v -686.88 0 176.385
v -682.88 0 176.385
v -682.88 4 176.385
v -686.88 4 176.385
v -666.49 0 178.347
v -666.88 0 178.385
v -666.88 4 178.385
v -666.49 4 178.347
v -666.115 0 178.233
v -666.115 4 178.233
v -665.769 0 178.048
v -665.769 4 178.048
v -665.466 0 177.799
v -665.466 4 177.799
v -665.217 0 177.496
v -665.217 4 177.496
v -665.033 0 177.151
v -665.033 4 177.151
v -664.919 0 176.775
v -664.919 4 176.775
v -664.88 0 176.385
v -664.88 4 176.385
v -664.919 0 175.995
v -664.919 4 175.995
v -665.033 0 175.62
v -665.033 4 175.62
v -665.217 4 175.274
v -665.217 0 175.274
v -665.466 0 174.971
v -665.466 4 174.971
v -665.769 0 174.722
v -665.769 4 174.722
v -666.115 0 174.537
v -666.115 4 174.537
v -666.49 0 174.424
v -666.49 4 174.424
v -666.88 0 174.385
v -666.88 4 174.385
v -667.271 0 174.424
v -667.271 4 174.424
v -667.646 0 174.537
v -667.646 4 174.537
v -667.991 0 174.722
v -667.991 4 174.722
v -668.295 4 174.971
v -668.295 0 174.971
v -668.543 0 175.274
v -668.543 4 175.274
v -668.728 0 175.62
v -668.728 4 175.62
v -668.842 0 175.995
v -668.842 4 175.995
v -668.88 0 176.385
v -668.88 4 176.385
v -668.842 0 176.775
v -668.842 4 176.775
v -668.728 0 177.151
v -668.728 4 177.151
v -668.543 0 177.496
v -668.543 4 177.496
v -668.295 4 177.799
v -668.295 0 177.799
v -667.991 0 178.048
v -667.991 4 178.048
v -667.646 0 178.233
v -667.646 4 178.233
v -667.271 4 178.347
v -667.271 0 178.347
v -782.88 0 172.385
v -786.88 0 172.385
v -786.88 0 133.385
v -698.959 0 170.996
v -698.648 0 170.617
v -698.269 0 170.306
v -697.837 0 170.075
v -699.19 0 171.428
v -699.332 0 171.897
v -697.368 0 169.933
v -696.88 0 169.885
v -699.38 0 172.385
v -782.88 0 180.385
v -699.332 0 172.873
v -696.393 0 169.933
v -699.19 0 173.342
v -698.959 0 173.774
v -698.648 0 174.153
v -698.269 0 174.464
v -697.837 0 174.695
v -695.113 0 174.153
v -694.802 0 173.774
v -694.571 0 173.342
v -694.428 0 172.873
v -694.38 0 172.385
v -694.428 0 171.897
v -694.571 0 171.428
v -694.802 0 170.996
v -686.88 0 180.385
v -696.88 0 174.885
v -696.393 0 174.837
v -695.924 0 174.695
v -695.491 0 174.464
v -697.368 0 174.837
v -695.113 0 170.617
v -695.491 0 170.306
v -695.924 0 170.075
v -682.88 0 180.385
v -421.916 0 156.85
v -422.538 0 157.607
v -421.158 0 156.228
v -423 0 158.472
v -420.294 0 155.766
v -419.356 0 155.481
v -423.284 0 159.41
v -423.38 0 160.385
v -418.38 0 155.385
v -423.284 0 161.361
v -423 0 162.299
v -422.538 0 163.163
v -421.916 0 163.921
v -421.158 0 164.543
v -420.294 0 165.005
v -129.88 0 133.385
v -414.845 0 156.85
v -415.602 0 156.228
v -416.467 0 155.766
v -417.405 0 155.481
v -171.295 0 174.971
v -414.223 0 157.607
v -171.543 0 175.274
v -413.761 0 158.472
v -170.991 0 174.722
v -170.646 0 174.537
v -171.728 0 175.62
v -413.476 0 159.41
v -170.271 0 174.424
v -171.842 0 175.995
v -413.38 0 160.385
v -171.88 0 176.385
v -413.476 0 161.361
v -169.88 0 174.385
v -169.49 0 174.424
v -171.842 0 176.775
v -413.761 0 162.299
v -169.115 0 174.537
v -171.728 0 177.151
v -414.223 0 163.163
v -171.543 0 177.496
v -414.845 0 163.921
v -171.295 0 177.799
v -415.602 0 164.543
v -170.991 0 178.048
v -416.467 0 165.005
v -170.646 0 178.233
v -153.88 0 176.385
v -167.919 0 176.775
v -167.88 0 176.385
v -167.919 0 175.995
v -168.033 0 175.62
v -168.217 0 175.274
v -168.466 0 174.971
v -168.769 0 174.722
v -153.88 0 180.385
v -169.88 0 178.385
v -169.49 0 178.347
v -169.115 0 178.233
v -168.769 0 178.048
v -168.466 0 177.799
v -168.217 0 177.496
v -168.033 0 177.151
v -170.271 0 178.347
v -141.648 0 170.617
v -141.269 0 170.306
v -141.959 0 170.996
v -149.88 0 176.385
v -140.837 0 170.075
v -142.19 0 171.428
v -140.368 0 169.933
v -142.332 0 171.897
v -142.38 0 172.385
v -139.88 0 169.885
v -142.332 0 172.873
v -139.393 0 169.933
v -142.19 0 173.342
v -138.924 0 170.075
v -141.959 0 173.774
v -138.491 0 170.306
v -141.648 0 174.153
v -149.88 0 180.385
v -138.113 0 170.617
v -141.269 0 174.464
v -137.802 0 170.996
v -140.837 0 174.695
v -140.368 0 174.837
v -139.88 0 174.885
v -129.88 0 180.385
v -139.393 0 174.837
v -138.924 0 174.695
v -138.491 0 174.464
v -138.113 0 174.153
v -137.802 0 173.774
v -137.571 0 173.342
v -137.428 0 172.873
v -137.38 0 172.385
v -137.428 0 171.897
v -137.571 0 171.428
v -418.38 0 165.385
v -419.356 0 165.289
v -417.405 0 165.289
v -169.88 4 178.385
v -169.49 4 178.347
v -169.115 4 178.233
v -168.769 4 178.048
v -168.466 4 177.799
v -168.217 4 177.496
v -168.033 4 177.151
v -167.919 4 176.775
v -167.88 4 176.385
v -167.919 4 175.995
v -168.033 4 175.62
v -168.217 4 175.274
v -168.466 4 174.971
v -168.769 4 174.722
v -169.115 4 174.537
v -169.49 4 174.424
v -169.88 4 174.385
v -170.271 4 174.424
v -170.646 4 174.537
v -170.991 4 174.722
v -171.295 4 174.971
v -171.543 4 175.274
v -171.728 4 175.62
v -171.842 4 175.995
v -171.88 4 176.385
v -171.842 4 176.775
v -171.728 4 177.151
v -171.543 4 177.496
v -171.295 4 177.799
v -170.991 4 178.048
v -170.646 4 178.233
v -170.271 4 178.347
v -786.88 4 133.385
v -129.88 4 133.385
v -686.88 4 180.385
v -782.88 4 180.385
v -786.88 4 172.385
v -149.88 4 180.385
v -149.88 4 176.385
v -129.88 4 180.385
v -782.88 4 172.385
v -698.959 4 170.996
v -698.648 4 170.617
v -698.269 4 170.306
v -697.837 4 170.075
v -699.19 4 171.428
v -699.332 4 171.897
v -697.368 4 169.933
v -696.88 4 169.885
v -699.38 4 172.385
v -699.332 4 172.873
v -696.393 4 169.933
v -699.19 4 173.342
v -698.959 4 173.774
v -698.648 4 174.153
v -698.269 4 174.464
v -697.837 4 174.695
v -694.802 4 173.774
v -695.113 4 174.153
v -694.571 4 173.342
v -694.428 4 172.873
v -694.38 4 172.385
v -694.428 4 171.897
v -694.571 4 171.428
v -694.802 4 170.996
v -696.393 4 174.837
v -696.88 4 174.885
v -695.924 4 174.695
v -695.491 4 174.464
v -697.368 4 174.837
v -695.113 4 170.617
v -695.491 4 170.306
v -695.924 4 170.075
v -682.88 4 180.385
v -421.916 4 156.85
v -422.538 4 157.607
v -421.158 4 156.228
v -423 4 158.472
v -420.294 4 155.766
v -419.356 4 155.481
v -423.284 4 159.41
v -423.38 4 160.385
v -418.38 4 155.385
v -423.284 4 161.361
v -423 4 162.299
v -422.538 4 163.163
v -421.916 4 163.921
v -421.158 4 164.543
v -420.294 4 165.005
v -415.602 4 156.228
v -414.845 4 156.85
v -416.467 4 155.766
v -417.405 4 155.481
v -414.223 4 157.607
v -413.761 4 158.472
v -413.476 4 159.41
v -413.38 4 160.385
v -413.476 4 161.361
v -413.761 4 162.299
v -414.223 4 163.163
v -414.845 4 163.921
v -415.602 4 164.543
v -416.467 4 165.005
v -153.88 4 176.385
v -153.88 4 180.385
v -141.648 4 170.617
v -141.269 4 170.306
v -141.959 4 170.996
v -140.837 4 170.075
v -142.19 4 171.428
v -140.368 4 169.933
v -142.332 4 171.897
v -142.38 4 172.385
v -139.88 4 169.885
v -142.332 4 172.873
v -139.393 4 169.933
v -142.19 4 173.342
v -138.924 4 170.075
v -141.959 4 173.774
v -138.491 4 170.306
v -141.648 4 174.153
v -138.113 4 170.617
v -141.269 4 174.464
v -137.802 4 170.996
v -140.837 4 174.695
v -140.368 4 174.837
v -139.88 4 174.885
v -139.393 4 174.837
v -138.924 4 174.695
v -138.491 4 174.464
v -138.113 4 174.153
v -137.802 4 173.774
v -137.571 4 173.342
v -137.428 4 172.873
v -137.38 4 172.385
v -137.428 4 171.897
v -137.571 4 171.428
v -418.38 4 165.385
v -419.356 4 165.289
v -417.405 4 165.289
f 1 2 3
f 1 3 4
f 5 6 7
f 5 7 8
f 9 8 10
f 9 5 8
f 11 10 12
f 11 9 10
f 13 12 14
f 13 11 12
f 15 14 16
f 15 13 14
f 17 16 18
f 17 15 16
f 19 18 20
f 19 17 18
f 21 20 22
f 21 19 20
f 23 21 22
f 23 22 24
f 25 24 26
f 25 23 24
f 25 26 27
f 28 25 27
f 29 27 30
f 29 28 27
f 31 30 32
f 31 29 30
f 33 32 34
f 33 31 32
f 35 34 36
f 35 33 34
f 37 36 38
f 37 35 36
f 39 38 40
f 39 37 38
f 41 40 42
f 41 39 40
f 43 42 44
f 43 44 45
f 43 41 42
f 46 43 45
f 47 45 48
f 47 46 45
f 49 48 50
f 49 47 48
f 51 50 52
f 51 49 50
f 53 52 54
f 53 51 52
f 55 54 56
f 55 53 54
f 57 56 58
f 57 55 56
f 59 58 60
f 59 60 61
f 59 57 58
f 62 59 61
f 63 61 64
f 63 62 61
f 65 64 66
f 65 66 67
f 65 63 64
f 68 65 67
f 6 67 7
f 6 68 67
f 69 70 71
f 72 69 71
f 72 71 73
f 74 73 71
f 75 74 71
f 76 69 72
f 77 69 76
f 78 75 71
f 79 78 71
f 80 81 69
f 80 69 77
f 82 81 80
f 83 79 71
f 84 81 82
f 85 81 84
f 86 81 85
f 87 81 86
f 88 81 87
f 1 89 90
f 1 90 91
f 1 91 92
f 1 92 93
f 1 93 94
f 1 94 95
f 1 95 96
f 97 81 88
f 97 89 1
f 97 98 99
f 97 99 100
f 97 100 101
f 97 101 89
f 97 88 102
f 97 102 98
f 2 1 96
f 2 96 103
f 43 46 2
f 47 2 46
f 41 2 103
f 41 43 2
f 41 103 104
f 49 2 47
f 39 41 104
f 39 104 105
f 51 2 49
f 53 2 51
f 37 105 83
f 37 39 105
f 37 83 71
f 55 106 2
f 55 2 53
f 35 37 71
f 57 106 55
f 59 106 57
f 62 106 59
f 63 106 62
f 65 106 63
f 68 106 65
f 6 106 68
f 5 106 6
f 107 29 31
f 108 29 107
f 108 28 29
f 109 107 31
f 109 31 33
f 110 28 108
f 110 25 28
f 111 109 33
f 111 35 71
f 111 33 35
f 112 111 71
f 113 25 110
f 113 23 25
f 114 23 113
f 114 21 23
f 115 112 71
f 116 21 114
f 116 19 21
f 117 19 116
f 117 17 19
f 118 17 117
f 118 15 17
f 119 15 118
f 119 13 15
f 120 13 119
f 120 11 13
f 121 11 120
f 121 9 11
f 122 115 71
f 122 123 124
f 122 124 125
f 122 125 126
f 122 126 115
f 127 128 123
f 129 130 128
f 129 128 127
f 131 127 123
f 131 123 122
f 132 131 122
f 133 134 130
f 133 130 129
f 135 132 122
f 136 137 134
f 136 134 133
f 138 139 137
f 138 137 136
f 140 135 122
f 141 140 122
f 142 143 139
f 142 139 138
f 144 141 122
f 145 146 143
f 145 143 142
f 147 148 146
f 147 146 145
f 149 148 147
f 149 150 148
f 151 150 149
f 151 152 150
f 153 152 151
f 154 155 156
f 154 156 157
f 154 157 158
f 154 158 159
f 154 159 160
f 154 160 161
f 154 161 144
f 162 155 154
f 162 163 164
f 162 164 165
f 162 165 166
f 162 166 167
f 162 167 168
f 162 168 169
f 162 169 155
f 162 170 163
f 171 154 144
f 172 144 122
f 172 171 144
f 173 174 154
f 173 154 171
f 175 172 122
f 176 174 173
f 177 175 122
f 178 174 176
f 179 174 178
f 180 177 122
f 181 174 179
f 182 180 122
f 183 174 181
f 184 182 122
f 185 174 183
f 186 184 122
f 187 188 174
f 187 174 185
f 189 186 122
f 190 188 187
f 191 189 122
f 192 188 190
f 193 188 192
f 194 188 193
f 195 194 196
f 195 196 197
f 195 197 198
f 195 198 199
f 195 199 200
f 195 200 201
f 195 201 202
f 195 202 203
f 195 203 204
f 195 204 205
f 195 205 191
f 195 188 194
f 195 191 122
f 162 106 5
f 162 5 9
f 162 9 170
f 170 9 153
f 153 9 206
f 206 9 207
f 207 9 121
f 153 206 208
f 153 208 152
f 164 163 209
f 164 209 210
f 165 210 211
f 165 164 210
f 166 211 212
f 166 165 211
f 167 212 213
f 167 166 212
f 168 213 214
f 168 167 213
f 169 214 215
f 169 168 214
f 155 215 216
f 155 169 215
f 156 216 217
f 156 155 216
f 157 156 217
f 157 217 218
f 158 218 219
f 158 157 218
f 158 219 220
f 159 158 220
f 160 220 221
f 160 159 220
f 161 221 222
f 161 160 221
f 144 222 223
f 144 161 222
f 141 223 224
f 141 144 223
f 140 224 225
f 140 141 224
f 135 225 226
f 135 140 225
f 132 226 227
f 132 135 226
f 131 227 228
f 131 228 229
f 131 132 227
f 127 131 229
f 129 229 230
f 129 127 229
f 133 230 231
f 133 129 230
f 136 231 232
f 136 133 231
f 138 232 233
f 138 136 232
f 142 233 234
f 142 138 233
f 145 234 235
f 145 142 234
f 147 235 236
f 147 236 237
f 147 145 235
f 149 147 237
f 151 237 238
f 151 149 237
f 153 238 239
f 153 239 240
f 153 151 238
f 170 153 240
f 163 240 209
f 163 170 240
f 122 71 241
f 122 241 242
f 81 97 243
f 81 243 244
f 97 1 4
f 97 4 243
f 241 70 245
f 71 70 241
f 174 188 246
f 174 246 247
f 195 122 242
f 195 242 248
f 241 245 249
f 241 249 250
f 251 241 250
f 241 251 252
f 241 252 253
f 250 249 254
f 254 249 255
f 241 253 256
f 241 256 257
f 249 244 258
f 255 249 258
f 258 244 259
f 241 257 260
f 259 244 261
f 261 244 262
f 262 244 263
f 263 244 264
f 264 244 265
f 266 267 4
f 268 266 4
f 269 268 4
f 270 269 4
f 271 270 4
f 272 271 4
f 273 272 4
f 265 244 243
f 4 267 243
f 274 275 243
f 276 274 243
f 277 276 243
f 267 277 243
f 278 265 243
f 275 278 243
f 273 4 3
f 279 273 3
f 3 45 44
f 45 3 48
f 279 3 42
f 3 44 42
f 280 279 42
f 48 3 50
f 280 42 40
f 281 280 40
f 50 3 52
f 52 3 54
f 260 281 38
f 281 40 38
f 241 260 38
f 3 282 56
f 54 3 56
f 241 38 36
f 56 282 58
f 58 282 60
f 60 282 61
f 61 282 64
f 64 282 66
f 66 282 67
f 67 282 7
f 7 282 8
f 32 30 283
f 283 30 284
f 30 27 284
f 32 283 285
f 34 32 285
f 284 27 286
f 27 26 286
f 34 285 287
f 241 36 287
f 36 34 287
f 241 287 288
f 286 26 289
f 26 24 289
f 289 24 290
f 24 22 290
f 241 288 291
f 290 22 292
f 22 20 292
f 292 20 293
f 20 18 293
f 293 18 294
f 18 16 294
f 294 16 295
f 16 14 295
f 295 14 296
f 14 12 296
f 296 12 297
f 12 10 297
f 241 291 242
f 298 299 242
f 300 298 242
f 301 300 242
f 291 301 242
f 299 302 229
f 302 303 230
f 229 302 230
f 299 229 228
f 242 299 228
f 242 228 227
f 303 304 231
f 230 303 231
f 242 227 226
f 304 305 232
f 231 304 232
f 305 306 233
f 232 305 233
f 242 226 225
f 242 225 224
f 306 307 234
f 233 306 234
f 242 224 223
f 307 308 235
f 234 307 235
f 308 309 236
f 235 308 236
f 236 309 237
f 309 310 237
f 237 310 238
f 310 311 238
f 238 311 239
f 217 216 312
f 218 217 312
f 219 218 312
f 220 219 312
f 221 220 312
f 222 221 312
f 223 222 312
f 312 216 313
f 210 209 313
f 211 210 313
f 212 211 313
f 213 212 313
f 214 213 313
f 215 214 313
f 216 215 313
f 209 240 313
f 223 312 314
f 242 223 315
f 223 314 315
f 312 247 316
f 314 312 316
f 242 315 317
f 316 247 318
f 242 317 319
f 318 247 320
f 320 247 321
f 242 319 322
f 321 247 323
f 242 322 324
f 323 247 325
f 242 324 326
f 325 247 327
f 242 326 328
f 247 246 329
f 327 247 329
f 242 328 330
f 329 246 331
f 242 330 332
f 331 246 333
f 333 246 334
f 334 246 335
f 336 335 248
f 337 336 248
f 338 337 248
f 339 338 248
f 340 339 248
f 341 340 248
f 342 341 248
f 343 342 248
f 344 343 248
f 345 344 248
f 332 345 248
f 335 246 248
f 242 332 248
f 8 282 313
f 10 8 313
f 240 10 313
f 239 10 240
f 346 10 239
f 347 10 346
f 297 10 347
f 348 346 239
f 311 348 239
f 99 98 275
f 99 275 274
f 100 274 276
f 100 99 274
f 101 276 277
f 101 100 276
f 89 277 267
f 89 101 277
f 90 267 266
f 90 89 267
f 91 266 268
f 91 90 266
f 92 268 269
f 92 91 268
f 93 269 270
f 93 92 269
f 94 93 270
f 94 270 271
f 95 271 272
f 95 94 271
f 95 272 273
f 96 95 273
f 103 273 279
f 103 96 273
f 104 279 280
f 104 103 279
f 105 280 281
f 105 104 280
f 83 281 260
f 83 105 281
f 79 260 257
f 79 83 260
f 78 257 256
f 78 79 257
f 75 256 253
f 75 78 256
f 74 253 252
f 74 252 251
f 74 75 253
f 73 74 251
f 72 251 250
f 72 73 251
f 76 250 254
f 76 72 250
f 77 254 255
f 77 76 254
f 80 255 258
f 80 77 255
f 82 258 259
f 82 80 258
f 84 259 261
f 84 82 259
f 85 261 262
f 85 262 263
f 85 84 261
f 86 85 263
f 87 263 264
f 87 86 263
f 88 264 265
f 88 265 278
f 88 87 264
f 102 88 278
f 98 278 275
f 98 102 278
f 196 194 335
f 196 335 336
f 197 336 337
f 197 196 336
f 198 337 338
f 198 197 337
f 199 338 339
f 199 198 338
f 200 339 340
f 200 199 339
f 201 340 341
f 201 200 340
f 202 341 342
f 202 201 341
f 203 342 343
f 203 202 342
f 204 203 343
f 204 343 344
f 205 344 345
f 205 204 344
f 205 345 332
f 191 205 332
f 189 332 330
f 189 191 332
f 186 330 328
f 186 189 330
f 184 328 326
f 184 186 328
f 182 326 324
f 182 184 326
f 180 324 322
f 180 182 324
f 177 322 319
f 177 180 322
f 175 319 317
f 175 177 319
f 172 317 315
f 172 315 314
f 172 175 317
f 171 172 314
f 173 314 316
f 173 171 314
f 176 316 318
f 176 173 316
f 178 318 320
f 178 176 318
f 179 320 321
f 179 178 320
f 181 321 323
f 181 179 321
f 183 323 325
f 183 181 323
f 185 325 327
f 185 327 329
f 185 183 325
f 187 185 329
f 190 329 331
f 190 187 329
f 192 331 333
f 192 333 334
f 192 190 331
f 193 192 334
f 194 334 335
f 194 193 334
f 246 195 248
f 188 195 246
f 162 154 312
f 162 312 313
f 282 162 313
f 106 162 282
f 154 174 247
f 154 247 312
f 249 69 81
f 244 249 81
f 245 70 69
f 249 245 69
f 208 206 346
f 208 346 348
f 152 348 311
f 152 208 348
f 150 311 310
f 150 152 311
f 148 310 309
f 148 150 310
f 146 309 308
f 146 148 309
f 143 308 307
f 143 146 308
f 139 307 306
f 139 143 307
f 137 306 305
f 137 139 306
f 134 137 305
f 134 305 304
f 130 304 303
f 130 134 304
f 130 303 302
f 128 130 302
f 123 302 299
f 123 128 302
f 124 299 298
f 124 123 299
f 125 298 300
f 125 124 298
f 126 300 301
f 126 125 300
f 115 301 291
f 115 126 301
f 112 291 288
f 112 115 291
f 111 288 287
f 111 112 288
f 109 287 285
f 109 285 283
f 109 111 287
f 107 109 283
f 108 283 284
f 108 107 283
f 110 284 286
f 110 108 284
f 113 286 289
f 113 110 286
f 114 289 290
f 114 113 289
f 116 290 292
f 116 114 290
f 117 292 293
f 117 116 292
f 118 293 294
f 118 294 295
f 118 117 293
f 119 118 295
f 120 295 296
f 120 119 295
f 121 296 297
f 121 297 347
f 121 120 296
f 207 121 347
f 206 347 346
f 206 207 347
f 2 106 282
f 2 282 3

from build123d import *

# Parameters (mm, degrees)
SKETCH1_R           = 2.5
SKETCH1_R_2         = 2
SKETCH1_R_3         = 5
BOSS_EXTRUDE1_DEPTH = 4
SKETCH2_W           = 4
SKETCH2_H           = 8
CUT_EXTRUDE1_DEPTH  = 4


with BuildPart() as part:
    # Sketch1 → Boss-Extrude1 (new body)
    with BuildSketch(Plane(origin=(-317.41656051, 0, 154.910133377), x_dir=(-1, 0, 0), z_dir=(0, 1, 0))):
        Polygon((-187.536213895, 25.475039652), (-167.536213895, 25.475039652), (-167.536213895, 21.475039652), (-163.536213895, 21.475039652), (-163.536213895, 25.475039652), (365.463786105, 25.475039652), (365.463786105, 21.475039652), (369.463786105, 21.475039652), (369.463786105, 25.475039652), (469.463786105, 25.475039652), (469.463786105, -21.524960348), (-187.536213895, -21.524960348), align=None)
        with Locations(Location((379.463786105, 17.475039652, 0), (0, 0, 90))):
            Circle(SKETCH1_R, mode=Mode.SUBTRACT)
        with Locations(Location((-177.536213895, 17.475039652, 0), (0, 0, 90))):
            Circle(SKETCH1_R, mode=Mode.SUBTRACT)
        with Locations(Location((349.463786105, 21.475039652, 0), (0, 0, 90))):
            Circle(SKETCH1_R_2, mode=Mode.SUBTRACT)
        with Locations(Location((-147.536213895, 21.475039652, 0), (0, 0, 90))):
            Circle(SKETCH1_R_2, mode=Mode.SUBTRACT)
        with Locations(Location((100.963786105, 5.475039652, 0), (0, 0, 90))):
            Circle(SKETCH1_R_3, mode=Mode.SUBTRACT)
    extrude(amount=BOSS_EXTRUDE1_DEPTH)

    # Sketch2 → Cut-Extrude1 (cut)
    with BuildSketch(Plane.XZ):
        with Locations((-784.880346614, 176.385173028)):
            Rectangle(SKETCH2_W, SKETCH2_H)
    extrude(amount=-CUT_EXTRUDE1_DEPTH, mode=Mode.SUBTRACT)


solid = part.part
